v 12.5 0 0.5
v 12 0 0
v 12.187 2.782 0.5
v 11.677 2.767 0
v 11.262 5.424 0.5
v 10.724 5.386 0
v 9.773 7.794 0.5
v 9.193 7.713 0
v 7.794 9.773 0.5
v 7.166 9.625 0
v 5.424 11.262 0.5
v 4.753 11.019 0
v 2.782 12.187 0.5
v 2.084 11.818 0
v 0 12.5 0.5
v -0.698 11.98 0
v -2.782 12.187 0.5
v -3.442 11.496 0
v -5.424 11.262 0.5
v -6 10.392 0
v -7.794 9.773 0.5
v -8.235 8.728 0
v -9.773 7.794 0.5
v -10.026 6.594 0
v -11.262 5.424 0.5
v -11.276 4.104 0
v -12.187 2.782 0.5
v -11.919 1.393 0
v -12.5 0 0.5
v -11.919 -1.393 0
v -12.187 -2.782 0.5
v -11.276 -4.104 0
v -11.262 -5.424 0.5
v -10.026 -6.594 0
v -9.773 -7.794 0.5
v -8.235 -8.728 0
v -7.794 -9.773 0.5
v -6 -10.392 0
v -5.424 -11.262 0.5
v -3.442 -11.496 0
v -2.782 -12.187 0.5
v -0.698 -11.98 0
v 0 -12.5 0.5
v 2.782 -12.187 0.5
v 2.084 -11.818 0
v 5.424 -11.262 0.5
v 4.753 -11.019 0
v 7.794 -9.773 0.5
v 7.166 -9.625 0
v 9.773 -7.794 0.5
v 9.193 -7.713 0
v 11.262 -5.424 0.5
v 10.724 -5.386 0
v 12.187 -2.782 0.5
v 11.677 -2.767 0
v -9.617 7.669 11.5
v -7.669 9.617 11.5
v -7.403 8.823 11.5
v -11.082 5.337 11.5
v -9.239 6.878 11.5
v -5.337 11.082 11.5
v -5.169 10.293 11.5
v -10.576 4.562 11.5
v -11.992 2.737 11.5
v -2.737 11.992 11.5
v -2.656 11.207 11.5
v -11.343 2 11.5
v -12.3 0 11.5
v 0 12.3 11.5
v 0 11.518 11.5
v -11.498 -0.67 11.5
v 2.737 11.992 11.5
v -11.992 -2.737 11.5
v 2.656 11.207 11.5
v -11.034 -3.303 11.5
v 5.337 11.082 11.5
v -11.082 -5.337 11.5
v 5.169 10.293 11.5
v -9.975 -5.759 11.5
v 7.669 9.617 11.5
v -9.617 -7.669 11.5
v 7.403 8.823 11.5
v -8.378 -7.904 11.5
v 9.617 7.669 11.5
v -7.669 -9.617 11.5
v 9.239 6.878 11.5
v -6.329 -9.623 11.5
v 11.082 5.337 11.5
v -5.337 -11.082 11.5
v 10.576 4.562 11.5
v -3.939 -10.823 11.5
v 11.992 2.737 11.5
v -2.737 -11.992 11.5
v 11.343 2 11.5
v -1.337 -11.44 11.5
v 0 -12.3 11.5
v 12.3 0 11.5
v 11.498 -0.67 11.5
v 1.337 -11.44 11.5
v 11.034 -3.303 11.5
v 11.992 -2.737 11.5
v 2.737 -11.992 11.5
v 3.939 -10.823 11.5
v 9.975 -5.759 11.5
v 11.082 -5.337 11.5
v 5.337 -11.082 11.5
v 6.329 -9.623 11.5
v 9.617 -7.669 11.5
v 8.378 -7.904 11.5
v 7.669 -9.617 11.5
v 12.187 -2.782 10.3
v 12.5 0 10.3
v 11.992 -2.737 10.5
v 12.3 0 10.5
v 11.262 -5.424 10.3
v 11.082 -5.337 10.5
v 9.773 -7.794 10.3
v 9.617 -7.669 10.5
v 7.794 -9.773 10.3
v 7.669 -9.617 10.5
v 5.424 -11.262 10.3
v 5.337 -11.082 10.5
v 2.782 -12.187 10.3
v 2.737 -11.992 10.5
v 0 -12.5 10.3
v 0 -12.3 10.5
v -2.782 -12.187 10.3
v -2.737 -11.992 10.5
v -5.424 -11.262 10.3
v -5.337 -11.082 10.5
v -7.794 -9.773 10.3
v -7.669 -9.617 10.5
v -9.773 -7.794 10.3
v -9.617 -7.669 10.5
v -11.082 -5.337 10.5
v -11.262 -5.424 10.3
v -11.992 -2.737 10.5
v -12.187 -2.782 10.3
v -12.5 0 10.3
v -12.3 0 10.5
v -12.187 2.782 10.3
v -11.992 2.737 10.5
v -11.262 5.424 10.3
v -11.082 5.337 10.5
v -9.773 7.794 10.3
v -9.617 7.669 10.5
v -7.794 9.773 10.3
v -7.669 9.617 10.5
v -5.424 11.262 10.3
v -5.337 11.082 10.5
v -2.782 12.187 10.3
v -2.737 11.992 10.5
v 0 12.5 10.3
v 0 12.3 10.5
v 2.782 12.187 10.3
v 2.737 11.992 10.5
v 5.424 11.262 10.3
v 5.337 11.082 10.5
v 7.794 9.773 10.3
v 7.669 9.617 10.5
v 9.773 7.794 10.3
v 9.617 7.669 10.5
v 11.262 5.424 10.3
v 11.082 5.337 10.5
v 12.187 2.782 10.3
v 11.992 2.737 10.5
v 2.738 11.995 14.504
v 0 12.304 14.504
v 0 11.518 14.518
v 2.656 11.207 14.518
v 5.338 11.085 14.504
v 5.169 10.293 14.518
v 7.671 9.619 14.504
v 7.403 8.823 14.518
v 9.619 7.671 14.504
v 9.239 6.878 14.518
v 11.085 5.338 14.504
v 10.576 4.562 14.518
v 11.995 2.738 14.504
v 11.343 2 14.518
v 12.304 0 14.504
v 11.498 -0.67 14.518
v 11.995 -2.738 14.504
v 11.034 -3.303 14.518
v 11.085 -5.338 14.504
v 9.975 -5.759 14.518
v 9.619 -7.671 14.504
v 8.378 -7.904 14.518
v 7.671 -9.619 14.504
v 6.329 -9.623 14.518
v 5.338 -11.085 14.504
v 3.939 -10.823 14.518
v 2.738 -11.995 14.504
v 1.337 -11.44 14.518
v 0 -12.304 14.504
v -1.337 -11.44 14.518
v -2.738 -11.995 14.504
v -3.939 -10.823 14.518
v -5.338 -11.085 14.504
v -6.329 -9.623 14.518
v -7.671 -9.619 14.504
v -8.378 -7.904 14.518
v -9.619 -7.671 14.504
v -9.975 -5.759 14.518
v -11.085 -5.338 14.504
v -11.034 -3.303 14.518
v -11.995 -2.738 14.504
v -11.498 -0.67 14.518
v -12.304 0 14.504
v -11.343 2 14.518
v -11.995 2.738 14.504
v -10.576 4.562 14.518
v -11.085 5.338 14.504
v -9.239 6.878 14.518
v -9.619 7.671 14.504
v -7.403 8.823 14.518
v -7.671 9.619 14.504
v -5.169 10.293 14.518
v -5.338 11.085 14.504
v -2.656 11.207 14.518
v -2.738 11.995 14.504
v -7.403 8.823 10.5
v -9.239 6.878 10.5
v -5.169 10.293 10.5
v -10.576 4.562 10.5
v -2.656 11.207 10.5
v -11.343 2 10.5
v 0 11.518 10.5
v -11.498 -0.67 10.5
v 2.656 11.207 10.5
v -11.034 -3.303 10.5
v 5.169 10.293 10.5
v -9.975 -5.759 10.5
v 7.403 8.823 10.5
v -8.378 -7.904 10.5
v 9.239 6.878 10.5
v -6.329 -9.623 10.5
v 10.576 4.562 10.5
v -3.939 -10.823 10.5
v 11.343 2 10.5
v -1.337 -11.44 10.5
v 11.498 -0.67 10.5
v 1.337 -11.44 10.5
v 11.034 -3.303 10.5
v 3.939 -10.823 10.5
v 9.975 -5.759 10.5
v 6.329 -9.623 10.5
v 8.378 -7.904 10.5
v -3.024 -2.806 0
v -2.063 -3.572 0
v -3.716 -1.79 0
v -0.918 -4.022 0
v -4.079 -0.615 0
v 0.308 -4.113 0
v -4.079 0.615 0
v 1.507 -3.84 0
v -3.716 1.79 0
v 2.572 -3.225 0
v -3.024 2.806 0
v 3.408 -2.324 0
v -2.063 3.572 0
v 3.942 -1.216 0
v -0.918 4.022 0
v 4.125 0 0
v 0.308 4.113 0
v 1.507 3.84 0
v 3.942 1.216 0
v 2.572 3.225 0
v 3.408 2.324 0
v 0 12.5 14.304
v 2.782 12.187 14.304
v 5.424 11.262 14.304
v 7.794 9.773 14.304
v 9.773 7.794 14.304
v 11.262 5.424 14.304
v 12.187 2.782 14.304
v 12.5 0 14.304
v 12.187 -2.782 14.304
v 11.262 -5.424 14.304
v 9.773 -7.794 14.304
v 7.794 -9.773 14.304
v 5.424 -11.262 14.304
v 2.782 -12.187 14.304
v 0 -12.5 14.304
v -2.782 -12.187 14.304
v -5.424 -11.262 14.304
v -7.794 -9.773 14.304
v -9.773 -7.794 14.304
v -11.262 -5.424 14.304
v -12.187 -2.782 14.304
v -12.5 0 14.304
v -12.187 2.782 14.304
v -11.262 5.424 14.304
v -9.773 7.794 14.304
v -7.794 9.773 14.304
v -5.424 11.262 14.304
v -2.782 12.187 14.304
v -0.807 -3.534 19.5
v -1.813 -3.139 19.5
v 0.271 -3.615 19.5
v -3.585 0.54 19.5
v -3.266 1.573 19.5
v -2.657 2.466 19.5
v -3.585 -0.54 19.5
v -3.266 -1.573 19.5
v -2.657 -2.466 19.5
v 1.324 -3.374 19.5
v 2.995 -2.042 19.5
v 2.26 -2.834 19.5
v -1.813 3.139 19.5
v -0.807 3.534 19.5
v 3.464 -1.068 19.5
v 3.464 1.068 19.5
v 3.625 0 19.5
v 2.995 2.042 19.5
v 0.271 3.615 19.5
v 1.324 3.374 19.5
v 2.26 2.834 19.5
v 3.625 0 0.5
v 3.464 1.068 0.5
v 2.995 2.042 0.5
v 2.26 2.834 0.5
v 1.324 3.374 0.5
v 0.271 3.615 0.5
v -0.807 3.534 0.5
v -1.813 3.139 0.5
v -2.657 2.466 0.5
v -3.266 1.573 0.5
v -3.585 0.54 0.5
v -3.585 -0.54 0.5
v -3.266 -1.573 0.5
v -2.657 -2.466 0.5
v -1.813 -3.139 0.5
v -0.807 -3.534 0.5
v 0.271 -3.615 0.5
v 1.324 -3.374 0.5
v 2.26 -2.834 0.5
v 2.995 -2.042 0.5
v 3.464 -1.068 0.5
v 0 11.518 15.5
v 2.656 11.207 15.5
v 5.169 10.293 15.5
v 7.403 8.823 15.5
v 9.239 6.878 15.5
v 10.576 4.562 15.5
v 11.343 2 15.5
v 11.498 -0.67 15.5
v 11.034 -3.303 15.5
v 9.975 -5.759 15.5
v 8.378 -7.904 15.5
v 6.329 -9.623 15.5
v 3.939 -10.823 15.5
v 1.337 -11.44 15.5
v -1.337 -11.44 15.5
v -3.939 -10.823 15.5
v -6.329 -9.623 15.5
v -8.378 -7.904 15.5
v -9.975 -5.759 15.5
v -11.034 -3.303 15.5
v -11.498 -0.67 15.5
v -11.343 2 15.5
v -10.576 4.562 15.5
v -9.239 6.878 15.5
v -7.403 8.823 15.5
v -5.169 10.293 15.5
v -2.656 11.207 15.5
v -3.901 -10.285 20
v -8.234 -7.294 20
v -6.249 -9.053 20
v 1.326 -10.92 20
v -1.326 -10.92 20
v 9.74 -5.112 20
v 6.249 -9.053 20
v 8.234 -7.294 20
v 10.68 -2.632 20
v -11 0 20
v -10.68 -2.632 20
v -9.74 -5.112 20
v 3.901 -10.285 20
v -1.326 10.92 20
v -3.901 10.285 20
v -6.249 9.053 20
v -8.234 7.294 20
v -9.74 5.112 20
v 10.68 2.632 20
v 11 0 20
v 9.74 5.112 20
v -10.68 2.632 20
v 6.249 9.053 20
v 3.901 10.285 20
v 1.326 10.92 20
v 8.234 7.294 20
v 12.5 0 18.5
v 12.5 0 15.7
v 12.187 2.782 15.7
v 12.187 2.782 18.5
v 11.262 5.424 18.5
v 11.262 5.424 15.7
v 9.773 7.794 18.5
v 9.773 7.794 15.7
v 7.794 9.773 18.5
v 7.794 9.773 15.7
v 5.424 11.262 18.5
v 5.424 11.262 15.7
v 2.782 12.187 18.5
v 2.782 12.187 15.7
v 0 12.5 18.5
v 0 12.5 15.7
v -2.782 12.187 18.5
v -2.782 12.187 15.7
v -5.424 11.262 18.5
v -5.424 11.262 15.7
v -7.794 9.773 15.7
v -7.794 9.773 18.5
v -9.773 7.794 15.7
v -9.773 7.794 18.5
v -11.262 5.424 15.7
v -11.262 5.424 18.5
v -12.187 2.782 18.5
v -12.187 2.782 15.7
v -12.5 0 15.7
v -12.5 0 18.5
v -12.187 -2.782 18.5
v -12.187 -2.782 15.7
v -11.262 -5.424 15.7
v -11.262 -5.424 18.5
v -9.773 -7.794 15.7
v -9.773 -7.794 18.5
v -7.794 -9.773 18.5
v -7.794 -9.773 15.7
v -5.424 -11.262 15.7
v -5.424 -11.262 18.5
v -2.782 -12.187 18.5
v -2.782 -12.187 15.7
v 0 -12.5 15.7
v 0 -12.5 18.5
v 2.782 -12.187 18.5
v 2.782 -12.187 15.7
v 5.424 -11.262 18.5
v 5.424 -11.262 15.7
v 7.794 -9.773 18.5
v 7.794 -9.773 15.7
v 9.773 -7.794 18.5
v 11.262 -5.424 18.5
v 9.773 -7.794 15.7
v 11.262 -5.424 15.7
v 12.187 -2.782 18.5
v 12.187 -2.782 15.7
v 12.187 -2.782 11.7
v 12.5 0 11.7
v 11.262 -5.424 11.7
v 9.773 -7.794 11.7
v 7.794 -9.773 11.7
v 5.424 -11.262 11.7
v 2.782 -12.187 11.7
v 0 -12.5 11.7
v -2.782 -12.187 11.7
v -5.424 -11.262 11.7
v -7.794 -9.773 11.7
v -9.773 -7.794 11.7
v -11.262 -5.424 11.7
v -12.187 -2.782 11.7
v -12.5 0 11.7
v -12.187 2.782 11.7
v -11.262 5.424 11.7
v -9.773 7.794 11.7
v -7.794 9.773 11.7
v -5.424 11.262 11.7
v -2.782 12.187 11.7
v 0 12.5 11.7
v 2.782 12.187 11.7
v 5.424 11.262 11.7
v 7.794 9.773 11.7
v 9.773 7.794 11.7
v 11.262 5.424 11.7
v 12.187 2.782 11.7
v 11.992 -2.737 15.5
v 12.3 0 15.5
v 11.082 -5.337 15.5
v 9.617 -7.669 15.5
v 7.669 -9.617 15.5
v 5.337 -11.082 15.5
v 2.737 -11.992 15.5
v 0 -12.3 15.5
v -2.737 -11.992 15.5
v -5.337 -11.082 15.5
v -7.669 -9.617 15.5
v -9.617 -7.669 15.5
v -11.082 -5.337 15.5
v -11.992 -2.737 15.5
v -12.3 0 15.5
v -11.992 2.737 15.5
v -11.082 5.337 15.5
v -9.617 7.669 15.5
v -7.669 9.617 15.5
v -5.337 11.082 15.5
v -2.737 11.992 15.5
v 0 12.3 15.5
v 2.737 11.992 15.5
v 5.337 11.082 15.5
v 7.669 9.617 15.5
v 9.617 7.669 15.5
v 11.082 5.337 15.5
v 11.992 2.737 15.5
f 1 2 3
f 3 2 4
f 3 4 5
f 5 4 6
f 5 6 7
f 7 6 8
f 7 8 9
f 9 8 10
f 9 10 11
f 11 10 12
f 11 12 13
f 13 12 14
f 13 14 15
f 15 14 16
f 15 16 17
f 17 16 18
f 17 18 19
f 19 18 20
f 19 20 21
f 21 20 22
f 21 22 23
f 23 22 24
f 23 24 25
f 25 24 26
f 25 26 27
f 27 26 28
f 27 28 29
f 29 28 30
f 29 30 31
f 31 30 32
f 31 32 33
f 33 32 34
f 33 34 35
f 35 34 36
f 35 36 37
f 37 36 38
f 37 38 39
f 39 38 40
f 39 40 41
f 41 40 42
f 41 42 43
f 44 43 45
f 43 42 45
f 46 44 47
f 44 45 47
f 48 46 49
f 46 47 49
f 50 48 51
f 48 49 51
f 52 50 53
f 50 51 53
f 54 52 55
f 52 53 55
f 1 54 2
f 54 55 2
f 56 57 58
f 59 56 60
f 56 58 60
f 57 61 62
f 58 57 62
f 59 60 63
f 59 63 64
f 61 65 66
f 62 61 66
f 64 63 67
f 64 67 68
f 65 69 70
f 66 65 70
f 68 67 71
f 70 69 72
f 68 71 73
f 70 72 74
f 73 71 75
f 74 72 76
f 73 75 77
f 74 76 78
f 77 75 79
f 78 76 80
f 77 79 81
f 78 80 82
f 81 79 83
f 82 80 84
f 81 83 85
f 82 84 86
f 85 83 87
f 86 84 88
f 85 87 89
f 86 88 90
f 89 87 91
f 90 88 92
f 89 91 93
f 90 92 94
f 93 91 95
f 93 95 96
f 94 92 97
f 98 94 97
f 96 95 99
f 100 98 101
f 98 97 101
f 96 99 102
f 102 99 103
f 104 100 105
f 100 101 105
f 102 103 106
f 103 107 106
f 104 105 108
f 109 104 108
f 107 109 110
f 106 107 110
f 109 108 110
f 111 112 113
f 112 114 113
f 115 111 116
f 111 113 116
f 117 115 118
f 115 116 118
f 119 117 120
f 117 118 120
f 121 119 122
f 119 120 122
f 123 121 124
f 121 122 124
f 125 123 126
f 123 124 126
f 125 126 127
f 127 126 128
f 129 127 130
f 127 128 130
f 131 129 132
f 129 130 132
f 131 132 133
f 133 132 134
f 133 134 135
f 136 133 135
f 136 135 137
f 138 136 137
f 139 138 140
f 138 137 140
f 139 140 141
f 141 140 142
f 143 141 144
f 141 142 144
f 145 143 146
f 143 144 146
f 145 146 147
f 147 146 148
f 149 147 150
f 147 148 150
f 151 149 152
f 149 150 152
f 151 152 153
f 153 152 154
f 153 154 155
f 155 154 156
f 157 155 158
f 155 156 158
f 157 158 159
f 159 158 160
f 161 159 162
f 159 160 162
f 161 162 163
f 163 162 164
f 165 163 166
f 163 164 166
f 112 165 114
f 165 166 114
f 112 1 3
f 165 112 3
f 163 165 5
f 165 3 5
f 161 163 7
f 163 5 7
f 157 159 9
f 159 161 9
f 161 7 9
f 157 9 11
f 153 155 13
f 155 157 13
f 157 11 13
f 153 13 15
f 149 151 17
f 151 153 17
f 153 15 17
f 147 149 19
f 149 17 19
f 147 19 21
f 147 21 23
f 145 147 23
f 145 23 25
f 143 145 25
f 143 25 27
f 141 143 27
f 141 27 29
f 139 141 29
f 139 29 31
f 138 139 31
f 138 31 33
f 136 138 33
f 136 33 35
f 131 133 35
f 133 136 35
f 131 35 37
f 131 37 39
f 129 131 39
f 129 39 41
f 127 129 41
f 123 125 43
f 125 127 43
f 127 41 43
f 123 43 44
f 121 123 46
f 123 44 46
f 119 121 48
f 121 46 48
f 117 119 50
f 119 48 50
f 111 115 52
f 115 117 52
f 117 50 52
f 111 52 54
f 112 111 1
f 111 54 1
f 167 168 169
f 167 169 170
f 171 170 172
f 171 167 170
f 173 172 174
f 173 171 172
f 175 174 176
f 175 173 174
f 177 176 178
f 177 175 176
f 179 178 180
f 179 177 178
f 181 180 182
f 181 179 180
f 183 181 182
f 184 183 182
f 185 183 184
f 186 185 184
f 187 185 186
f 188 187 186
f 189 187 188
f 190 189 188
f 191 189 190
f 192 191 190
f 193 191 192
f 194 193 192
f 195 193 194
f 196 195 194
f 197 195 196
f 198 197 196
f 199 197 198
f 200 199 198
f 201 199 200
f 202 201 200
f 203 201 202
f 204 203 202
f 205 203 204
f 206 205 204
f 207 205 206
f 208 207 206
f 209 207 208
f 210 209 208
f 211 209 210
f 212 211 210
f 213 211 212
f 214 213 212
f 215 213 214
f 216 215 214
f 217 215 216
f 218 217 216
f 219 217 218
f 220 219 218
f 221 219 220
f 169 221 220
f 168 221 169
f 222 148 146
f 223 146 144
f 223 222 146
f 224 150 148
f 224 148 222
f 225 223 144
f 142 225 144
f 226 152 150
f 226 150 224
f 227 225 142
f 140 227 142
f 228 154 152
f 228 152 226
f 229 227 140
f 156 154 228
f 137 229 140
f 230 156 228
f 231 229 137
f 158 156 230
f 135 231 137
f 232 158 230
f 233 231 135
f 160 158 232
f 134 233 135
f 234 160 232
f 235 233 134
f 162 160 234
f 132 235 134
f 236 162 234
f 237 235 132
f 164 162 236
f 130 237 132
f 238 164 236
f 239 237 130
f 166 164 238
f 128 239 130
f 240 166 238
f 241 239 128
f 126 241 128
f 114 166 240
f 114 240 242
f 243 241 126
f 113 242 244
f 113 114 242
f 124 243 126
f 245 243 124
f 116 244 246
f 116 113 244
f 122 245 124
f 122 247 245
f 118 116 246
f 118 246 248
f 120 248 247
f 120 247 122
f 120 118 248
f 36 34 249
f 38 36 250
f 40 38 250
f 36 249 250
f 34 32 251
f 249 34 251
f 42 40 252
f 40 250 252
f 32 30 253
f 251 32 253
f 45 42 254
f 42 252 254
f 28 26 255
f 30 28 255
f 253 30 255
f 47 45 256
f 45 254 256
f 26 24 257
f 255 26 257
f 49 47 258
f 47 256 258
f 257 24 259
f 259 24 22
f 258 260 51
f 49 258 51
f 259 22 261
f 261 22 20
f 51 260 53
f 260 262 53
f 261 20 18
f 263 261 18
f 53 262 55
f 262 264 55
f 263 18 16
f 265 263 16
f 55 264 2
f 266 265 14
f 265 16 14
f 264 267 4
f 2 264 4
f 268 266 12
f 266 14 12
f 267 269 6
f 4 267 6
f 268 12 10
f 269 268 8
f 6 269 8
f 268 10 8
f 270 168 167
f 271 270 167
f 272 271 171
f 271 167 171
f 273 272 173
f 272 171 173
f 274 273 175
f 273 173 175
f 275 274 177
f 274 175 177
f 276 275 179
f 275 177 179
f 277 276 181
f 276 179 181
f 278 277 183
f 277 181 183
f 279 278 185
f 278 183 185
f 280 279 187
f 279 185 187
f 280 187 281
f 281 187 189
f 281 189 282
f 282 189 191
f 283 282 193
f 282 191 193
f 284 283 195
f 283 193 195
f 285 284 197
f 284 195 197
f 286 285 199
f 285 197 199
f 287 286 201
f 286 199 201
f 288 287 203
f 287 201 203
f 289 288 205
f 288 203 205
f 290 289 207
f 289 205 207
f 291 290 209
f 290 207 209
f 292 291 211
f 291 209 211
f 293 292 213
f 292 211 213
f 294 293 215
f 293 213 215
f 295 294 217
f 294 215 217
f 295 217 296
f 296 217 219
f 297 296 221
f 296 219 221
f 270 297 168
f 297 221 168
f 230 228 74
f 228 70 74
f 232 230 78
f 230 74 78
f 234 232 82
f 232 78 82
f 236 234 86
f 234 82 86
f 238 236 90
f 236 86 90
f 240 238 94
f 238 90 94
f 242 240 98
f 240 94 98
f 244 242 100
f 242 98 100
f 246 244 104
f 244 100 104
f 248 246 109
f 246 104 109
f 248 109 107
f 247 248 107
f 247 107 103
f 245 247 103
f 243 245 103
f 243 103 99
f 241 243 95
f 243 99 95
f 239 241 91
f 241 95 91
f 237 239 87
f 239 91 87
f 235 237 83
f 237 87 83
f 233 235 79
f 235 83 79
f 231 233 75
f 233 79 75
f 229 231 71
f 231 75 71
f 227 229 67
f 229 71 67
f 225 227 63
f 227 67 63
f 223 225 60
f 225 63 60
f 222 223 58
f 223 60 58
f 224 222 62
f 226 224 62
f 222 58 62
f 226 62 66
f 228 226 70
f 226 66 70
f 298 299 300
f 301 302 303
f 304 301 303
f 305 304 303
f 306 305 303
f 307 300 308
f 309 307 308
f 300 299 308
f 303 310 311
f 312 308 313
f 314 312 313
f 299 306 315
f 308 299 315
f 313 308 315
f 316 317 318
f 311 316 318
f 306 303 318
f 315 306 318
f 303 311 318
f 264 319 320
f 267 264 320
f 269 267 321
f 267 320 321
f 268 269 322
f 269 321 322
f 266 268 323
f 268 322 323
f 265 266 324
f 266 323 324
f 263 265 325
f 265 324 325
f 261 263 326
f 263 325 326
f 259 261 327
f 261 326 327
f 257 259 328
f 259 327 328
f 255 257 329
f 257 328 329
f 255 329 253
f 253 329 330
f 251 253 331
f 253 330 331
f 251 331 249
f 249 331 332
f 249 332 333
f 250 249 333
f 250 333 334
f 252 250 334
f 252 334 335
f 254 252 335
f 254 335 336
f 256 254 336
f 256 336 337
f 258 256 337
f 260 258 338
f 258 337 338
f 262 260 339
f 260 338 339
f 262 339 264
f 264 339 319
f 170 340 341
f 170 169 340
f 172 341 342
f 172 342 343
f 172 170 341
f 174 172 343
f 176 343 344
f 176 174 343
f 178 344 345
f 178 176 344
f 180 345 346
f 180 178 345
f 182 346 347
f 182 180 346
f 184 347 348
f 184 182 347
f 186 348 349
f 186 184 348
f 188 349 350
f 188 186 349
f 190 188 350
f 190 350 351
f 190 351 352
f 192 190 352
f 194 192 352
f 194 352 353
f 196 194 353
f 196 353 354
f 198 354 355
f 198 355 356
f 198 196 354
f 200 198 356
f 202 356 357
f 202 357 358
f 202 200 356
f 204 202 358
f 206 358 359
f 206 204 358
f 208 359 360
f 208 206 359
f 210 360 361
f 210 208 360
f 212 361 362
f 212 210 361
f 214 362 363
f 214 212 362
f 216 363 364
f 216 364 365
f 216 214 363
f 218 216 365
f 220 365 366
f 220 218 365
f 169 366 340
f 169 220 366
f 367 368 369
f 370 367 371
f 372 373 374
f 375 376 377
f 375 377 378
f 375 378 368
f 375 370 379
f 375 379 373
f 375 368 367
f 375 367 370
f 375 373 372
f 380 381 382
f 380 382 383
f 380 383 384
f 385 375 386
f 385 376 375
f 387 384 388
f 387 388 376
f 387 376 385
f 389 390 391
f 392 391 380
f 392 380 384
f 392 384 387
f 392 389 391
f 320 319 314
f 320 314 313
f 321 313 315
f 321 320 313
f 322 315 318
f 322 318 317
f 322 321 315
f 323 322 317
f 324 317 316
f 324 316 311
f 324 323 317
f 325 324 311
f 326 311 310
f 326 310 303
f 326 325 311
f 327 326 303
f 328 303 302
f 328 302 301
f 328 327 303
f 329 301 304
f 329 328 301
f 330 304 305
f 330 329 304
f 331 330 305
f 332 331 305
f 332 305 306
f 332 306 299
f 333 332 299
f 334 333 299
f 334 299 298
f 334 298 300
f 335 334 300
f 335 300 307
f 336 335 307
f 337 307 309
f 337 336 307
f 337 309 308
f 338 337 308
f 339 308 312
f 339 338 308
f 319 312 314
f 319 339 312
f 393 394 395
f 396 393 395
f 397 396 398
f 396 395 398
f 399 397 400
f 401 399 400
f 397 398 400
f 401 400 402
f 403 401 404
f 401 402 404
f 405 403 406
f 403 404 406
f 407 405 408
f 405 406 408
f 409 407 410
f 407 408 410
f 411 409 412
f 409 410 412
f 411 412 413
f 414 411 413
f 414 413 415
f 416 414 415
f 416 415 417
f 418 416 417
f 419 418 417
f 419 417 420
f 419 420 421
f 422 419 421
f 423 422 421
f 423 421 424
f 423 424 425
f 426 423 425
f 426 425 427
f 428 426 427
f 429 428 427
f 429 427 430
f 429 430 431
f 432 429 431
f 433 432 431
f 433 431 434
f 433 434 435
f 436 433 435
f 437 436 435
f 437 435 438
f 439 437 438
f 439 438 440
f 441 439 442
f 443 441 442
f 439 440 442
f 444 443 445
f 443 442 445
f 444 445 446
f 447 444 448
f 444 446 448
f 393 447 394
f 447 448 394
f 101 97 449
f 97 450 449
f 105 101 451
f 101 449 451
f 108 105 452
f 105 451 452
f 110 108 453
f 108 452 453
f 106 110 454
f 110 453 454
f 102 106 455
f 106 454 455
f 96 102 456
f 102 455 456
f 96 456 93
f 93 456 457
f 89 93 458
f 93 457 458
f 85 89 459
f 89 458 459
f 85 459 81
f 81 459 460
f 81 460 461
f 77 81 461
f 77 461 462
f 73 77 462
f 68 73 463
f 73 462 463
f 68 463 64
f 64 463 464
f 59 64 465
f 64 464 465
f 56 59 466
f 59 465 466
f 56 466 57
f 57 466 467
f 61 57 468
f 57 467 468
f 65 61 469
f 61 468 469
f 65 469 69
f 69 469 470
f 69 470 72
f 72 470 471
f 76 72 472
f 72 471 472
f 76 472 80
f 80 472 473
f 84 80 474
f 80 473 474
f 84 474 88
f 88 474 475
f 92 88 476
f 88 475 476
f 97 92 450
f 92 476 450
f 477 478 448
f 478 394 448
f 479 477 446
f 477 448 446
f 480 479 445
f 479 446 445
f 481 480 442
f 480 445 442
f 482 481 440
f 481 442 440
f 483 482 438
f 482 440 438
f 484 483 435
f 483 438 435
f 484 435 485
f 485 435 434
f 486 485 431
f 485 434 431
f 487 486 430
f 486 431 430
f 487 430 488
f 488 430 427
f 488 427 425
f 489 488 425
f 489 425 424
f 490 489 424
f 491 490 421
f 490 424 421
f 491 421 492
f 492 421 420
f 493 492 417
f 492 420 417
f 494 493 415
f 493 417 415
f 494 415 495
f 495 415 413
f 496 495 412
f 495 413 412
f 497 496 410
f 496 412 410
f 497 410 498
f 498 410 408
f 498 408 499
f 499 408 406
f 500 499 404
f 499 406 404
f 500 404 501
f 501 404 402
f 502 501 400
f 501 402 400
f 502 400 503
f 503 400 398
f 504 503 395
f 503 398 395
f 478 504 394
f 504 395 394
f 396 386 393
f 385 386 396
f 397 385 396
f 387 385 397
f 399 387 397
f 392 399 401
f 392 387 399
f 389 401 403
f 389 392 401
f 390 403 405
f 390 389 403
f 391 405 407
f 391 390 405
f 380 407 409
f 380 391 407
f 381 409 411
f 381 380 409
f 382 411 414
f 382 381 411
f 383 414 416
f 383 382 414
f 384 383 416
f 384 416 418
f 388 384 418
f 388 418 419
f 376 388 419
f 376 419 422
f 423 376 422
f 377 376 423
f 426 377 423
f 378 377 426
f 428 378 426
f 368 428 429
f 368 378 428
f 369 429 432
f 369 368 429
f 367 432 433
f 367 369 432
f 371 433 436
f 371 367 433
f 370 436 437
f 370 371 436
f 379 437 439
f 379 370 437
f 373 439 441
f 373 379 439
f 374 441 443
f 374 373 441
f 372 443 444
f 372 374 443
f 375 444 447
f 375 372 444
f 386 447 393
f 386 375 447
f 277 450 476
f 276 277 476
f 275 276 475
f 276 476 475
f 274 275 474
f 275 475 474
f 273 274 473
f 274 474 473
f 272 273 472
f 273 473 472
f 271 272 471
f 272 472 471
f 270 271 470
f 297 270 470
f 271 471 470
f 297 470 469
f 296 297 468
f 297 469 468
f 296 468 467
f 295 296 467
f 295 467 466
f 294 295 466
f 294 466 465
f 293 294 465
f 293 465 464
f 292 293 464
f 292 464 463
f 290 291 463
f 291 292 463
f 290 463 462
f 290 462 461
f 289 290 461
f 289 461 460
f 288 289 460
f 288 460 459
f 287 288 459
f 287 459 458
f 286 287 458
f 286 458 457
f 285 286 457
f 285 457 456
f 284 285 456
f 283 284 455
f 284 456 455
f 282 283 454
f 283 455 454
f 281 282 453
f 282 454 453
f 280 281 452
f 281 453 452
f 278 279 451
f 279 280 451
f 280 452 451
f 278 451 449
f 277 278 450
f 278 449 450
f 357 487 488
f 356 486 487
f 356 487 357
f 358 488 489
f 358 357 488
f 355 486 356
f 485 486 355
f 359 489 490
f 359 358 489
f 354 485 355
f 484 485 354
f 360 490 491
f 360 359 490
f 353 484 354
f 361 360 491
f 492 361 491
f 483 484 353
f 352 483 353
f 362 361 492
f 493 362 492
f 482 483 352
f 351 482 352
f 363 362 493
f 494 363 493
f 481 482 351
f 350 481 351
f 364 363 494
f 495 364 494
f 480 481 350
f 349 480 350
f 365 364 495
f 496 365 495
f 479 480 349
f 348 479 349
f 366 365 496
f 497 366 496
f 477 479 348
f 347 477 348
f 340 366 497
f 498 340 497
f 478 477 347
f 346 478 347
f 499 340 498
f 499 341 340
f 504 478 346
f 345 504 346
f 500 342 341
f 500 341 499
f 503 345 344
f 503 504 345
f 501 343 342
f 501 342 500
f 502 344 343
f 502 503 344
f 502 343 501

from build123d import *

# Parameters (mm, degrees)
F0_R        = 12.5
F1_DEPTH    = 20
F2_R        = 3.625
F3_DEPTH    = 19.5
F4_SIZE     = 1.5
F5_SIZE     = 0.5
F6_W        = 1
F6_H        = 1
F8_T4_ANGLE = 270
F8_T6_ANGLE = 90


# Not quite as in the source:
# - a fillet or chamfer that OpenCascade refuses, or shapes differently, is made with other operations: its cross-section is extruded or revolved along the edge and cut away or added


with BuildPart() as f1:
    # F0 (on Top) → F1 (new body)
    with BuildSketch(Plane.XY):
        Circle(F0_R)
    extrude(amount=F1_DEPTH)

    # F2 (on Top) → F3 (cut)
    with BuildSketch(Plane.XY):
        Circle(F2_R)
    extrude(amount=F3_DEPTH, mode=Mode.SUBTRACT)

    # F4
    f4_edges = [f1.edges().sort_by_distance(p)[0] for p in [
        (-12.5, 0, 20),
    ]]
    chamfer(f4_edges, length=F4_SIZE)

    # F5
    f5_edges = [f1.edges().sort_by_distance(p)[0] for p in [
        (-12.5, 0, 0),
        (-3.625, 0, 0),
    ]]
    chamfer(f5_edges, length=F5_SIZE)

    # F6 (on Right) → F7 (revolve, cut)
    with BuildSketch(Plane.YZ):
        Polygon((12.5177614391, 14.5), (12.5177614391, 15.5), (11.5177614391, 15.5), (11.5177614391, 14.5179004222), align=None)
        with Locations((12.0177614391, 11)):
            Rectangle(F6_W, F6_H)
    revolve(axis=Axis((0, 0, 0), (0, 0, -1)), mode=Mode.SUBTRACT)

    # F8: chamfer of 0.2 on 5 edges, made by hand

    # F8_s1 → F8_t2 (revolve, cut)
    with BuildSketch(Plane.XZ):
        Polygon((12.3, 15.5), (12.5, 15.7), (12.5, 15.5), align=None)
    revolve(axis=Axis((0, 0, 15.5), (0, 0, -1)), mode=Mode.SUBTRACT)

    # F8_s3 → F8_t4 (revolve, cut)
    with BuildSketch(Plane.XZ):
        Polygon((12.5, 14.3038659818), (12.303579511, 14.5038339469), (12.5, 14.5003179373), align=None)
    revolve(axis=Axis((0, 0, 14.5003179373), (0, 0, -1)), revolution_arc=F8_T4_ANGLE, mode=Mode.SUBTRACT)

    # F8_s5 → F8_t6 (revolve, cut)
    with BuildSketch(Plane.YZ):
        Polygon((12.5, 14.3038659818), (12.303579511, 14.5038339469), (12.5, 14.5003179373), align=None)
    revolve(axis=Axis((0, 0, 14.5003179373), (0, 0, -1)), revolution_arc=F8_T6_ANGLE, mode=Mode.SUBTRACT)

    # F8_s7 → F8_t8 (revolve, cut)
    with BuildSketch(Plane.XZ):
        Polygon((12.3, 11.5), (12.5, 11.7), (12.5, 11.5), align=None)
    revolve(axis=Axis((0, 0, 11.5), (0, 0, -1)), mode=Mode.SUBTRACT)

    # F8_s9 → F8_t10 (revolve, cut)
    with BuildSketch(Plane.XZ):
        Polygon((12.5, 10.3), (12.3, 10.5), (12.5, 10.5), align=None)
    revolve(axis=Axis((0, 0, 10.5), (0, 0, -1)), mode=Mode.SUBTRACT)


solid = f1.part
